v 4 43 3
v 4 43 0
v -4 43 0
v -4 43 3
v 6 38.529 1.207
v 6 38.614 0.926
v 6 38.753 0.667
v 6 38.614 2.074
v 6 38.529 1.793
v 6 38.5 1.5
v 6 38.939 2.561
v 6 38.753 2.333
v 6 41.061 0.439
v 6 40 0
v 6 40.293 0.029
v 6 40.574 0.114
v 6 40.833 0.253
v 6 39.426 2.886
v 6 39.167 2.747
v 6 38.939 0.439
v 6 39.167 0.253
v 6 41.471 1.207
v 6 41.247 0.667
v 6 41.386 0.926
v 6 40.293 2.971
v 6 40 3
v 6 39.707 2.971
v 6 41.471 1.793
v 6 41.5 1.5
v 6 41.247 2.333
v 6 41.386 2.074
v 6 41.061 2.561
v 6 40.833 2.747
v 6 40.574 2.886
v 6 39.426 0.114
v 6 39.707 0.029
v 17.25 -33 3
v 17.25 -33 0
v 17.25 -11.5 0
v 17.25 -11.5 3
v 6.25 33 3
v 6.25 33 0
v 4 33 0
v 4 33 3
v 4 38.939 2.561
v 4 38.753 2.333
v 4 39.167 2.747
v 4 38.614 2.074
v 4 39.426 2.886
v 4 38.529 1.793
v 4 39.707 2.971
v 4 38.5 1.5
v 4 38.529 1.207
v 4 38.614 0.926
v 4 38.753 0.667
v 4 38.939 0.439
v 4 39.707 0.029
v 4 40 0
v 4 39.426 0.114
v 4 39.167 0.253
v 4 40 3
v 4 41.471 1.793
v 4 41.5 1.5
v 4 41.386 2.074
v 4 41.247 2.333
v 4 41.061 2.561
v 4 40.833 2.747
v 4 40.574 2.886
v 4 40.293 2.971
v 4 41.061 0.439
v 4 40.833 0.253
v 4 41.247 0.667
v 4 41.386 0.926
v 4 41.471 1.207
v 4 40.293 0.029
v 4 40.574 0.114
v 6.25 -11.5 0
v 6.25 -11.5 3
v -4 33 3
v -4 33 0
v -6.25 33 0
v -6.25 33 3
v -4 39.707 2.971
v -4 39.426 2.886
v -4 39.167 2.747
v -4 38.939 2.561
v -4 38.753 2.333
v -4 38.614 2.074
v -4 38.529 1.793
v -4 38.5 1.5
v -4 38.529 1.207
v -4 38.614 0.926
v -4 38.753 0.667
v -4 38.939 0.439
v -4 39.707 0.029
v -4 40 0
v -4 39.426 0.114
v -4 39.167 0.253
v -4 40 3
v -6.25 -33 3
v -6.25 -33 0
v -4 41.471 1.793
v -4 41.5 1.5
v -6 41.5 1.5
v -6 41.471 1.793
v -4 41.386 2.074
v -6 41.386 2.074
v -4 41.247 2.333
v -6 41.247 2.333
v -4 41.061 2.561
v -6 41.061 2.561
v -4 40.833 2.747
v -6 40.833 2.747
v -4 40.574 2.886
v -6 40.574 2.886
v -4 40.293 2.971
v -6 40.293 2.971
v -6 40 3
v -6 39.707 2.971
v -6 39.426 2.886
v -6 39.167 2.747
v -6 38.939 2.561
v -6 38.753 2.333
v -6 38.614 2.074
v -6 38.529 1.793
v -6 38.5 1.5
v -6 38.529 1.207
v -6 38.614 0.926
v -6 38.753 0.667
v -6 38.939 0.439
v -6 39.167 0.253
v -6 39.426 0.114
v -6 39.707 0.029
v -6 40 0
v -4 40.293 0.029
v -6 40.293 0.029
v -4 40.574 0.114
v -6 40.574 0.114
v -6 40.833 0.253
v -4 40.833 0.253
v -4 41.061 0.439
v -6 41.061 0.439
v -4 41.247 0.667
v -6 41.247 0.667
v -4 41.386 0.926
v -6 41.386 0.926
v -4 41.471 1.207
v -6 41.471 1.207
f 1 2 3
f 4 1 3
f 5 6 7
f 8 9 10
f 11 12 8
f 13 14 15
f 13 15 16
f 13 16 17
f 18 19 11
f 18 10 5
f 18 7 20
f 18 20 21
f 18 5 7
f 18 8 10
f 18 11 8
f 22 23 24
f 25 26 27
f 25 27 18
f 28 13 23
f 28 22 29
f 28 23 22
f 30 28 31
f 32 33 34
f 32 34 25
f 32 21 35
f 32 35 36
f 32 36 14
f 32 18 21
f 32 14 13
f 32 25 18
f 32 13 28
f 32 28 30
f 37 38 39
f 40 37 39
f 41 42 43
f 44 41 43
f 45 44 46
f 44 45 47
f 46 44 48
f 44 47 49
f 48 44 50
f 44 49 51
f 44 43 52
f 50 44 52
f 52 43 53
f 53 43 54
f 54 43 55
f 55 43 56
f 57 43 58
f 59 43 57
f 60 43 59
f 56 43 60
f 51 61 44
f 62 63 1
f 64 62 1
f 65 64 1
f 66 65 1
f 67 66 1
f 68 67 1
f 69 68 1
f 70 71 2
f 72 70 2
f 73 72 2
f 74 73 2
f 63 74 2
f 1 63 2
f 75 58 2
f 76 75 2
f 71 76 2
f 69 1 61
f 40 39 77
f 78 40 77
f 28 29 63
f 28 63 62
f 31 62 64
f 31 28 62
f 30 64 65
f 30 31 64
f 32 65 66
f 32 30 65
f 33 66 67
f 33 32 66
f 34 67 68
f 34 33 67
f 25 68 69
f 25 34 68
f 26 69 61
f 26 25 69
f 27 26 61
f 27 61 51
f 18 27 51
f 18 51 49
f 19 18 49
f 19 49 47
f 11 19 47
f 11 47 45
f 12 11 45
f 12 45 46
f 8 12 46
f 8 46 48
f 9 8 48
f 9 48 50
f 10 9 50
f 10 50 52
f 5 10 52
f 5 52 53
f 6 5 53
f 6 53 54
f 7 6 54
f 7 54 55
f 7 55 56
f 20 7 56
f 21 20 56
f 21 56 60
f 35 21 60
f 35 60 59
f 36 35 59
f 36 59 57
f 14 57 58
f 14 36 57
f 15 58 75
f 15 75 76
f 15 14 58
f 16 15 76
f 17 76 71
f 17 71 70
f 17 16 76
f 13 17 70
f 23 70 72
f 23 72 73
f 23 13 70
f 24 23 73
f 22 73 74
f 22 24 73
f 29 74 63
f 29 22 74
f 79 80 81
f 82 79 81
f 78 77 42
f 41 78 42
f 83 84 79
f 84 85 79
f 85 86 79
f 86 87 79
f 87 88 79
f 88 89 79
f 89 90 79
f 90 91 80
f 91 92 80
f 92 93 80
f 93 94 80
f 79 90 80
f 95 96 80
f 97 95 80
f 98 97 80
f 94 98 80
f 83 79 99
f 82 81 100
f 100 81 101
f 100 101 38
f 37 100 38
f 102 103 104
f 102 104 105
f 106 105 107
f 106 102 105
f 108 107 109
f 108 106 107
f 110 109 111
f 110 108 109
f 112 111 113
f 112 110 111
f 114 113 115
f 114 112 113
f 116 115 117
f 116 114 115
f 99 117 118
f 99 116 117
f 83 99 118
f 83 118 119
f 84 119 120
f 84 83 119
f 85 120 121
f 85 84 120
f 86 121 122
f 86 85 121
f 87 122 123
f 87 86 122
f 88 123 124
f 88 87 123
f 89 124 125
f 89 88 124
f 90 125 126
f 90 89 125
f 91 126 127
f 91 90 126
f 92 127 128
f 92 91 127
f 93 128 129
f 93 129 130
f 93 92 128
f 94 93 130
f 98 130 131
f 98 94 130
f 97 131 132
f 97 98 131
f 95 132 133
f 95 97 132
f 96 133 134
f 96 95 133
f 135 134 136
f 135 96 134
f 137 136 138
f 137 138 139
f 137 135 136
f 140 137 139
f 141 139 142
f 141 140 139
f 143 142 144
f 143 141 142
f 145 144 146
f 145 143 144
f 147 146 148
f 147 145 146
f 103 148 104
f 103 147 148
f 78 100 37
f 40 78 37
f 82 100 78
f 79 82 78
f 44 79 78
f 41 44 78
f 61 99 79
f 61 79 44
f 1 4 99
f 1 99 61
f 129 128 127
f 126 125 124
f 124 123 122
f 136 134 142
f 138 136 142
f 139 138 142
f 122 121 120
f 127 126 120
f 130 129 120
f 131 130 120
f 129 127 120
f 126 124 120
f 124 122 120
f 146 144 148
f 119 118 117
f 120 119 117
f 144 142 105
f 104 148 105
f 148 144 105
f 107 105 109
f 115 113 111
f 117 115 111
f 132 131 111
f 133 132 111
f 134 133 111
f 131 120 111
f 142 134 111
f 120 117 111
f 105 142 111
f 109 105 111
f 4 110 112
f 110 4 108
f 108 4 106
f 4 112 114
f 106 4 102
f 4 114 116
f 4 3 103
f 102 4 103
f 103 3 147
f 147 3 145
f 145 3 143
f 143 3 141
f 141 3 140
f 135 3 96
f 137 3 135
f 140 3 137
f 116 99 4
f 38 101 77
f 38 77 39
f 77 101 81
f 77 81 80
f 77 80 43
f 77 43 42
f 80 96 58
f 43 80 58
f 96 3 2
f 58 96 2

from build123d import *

# Parameters (mm, degrees)
PAD_DEPTH    = 3
SKETCH001_R  = 1.5
PAD001_DEPTH = 6


with BuildPart() as part:
    # Sketch → Pad (new body)
    with BuildSketch(Plane.XY):
        Polygon((-6.25, 33), (-6.25, -33), (17.25, -33), (17.25, -11.5), (6.25, -11.5), (6.25, 33), (4, 33), (4, 43), (-4, 43), (-4, 33), align=None)
    extrude(amount=PAD_DEPTH)

    # Sketch001 → Pad001 (join, symmetric)
    with BuildSketch(Plane.YZ):
        with Locations((40, 1.5)):
            Circle(SKETCH001_R)
    extrude(amount=PAD001_DEPTH, both=True)


solid = part.part
